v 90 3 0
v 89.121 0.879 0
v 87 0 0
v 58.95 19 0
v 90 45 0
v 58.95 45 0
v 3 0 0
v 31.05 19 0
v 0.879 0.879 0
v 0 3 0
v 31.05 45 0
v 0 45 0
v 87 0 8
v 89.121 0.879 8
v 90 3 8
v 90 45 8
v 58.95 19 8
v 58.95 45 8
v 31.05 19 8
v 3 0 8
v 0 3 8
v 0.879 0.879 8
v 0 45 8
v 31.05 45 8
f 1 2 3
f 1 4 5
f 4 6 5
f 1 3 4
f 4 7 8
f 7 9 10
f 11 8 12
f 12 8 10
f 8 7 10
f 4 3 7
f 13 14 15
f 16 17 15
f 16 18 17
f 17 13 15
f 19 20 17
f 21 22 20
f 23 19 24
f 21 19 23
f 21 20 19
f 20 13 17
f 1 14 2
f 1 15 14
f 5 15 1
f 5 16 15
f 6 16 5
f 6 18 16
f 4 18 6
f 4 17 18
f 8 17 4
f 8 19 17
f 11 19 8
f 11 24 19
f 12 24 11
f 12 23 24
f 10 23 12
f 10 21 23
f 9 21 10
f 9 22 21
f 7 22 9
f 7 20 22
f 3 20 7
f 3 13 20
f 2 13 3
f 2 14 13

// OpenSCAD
$fn = 32;

// ----------------------------------------------------------------------
// Window plate: 90 x 45 mm, 1 open windows
// ----------------------------------------------------------------------

// --- parameters (mm) ---
profile_height = 8;       // extrusion height
profile_points = 12;      // points of the closed outline

profile = [[0, 3], [0.879, 0.879], [3, 0], [87, 0], [89.121, 0.879], [90, 3], [90, 45], [58.95, 45], [58.95, 19], [31.05, 19], [31.05, 45], [0, 45]];  // single closed polygon, 12 points, counter clockwise

// --- the one profile operation ---
linear_extrude(height = profile_height) polygon(points = profile);
